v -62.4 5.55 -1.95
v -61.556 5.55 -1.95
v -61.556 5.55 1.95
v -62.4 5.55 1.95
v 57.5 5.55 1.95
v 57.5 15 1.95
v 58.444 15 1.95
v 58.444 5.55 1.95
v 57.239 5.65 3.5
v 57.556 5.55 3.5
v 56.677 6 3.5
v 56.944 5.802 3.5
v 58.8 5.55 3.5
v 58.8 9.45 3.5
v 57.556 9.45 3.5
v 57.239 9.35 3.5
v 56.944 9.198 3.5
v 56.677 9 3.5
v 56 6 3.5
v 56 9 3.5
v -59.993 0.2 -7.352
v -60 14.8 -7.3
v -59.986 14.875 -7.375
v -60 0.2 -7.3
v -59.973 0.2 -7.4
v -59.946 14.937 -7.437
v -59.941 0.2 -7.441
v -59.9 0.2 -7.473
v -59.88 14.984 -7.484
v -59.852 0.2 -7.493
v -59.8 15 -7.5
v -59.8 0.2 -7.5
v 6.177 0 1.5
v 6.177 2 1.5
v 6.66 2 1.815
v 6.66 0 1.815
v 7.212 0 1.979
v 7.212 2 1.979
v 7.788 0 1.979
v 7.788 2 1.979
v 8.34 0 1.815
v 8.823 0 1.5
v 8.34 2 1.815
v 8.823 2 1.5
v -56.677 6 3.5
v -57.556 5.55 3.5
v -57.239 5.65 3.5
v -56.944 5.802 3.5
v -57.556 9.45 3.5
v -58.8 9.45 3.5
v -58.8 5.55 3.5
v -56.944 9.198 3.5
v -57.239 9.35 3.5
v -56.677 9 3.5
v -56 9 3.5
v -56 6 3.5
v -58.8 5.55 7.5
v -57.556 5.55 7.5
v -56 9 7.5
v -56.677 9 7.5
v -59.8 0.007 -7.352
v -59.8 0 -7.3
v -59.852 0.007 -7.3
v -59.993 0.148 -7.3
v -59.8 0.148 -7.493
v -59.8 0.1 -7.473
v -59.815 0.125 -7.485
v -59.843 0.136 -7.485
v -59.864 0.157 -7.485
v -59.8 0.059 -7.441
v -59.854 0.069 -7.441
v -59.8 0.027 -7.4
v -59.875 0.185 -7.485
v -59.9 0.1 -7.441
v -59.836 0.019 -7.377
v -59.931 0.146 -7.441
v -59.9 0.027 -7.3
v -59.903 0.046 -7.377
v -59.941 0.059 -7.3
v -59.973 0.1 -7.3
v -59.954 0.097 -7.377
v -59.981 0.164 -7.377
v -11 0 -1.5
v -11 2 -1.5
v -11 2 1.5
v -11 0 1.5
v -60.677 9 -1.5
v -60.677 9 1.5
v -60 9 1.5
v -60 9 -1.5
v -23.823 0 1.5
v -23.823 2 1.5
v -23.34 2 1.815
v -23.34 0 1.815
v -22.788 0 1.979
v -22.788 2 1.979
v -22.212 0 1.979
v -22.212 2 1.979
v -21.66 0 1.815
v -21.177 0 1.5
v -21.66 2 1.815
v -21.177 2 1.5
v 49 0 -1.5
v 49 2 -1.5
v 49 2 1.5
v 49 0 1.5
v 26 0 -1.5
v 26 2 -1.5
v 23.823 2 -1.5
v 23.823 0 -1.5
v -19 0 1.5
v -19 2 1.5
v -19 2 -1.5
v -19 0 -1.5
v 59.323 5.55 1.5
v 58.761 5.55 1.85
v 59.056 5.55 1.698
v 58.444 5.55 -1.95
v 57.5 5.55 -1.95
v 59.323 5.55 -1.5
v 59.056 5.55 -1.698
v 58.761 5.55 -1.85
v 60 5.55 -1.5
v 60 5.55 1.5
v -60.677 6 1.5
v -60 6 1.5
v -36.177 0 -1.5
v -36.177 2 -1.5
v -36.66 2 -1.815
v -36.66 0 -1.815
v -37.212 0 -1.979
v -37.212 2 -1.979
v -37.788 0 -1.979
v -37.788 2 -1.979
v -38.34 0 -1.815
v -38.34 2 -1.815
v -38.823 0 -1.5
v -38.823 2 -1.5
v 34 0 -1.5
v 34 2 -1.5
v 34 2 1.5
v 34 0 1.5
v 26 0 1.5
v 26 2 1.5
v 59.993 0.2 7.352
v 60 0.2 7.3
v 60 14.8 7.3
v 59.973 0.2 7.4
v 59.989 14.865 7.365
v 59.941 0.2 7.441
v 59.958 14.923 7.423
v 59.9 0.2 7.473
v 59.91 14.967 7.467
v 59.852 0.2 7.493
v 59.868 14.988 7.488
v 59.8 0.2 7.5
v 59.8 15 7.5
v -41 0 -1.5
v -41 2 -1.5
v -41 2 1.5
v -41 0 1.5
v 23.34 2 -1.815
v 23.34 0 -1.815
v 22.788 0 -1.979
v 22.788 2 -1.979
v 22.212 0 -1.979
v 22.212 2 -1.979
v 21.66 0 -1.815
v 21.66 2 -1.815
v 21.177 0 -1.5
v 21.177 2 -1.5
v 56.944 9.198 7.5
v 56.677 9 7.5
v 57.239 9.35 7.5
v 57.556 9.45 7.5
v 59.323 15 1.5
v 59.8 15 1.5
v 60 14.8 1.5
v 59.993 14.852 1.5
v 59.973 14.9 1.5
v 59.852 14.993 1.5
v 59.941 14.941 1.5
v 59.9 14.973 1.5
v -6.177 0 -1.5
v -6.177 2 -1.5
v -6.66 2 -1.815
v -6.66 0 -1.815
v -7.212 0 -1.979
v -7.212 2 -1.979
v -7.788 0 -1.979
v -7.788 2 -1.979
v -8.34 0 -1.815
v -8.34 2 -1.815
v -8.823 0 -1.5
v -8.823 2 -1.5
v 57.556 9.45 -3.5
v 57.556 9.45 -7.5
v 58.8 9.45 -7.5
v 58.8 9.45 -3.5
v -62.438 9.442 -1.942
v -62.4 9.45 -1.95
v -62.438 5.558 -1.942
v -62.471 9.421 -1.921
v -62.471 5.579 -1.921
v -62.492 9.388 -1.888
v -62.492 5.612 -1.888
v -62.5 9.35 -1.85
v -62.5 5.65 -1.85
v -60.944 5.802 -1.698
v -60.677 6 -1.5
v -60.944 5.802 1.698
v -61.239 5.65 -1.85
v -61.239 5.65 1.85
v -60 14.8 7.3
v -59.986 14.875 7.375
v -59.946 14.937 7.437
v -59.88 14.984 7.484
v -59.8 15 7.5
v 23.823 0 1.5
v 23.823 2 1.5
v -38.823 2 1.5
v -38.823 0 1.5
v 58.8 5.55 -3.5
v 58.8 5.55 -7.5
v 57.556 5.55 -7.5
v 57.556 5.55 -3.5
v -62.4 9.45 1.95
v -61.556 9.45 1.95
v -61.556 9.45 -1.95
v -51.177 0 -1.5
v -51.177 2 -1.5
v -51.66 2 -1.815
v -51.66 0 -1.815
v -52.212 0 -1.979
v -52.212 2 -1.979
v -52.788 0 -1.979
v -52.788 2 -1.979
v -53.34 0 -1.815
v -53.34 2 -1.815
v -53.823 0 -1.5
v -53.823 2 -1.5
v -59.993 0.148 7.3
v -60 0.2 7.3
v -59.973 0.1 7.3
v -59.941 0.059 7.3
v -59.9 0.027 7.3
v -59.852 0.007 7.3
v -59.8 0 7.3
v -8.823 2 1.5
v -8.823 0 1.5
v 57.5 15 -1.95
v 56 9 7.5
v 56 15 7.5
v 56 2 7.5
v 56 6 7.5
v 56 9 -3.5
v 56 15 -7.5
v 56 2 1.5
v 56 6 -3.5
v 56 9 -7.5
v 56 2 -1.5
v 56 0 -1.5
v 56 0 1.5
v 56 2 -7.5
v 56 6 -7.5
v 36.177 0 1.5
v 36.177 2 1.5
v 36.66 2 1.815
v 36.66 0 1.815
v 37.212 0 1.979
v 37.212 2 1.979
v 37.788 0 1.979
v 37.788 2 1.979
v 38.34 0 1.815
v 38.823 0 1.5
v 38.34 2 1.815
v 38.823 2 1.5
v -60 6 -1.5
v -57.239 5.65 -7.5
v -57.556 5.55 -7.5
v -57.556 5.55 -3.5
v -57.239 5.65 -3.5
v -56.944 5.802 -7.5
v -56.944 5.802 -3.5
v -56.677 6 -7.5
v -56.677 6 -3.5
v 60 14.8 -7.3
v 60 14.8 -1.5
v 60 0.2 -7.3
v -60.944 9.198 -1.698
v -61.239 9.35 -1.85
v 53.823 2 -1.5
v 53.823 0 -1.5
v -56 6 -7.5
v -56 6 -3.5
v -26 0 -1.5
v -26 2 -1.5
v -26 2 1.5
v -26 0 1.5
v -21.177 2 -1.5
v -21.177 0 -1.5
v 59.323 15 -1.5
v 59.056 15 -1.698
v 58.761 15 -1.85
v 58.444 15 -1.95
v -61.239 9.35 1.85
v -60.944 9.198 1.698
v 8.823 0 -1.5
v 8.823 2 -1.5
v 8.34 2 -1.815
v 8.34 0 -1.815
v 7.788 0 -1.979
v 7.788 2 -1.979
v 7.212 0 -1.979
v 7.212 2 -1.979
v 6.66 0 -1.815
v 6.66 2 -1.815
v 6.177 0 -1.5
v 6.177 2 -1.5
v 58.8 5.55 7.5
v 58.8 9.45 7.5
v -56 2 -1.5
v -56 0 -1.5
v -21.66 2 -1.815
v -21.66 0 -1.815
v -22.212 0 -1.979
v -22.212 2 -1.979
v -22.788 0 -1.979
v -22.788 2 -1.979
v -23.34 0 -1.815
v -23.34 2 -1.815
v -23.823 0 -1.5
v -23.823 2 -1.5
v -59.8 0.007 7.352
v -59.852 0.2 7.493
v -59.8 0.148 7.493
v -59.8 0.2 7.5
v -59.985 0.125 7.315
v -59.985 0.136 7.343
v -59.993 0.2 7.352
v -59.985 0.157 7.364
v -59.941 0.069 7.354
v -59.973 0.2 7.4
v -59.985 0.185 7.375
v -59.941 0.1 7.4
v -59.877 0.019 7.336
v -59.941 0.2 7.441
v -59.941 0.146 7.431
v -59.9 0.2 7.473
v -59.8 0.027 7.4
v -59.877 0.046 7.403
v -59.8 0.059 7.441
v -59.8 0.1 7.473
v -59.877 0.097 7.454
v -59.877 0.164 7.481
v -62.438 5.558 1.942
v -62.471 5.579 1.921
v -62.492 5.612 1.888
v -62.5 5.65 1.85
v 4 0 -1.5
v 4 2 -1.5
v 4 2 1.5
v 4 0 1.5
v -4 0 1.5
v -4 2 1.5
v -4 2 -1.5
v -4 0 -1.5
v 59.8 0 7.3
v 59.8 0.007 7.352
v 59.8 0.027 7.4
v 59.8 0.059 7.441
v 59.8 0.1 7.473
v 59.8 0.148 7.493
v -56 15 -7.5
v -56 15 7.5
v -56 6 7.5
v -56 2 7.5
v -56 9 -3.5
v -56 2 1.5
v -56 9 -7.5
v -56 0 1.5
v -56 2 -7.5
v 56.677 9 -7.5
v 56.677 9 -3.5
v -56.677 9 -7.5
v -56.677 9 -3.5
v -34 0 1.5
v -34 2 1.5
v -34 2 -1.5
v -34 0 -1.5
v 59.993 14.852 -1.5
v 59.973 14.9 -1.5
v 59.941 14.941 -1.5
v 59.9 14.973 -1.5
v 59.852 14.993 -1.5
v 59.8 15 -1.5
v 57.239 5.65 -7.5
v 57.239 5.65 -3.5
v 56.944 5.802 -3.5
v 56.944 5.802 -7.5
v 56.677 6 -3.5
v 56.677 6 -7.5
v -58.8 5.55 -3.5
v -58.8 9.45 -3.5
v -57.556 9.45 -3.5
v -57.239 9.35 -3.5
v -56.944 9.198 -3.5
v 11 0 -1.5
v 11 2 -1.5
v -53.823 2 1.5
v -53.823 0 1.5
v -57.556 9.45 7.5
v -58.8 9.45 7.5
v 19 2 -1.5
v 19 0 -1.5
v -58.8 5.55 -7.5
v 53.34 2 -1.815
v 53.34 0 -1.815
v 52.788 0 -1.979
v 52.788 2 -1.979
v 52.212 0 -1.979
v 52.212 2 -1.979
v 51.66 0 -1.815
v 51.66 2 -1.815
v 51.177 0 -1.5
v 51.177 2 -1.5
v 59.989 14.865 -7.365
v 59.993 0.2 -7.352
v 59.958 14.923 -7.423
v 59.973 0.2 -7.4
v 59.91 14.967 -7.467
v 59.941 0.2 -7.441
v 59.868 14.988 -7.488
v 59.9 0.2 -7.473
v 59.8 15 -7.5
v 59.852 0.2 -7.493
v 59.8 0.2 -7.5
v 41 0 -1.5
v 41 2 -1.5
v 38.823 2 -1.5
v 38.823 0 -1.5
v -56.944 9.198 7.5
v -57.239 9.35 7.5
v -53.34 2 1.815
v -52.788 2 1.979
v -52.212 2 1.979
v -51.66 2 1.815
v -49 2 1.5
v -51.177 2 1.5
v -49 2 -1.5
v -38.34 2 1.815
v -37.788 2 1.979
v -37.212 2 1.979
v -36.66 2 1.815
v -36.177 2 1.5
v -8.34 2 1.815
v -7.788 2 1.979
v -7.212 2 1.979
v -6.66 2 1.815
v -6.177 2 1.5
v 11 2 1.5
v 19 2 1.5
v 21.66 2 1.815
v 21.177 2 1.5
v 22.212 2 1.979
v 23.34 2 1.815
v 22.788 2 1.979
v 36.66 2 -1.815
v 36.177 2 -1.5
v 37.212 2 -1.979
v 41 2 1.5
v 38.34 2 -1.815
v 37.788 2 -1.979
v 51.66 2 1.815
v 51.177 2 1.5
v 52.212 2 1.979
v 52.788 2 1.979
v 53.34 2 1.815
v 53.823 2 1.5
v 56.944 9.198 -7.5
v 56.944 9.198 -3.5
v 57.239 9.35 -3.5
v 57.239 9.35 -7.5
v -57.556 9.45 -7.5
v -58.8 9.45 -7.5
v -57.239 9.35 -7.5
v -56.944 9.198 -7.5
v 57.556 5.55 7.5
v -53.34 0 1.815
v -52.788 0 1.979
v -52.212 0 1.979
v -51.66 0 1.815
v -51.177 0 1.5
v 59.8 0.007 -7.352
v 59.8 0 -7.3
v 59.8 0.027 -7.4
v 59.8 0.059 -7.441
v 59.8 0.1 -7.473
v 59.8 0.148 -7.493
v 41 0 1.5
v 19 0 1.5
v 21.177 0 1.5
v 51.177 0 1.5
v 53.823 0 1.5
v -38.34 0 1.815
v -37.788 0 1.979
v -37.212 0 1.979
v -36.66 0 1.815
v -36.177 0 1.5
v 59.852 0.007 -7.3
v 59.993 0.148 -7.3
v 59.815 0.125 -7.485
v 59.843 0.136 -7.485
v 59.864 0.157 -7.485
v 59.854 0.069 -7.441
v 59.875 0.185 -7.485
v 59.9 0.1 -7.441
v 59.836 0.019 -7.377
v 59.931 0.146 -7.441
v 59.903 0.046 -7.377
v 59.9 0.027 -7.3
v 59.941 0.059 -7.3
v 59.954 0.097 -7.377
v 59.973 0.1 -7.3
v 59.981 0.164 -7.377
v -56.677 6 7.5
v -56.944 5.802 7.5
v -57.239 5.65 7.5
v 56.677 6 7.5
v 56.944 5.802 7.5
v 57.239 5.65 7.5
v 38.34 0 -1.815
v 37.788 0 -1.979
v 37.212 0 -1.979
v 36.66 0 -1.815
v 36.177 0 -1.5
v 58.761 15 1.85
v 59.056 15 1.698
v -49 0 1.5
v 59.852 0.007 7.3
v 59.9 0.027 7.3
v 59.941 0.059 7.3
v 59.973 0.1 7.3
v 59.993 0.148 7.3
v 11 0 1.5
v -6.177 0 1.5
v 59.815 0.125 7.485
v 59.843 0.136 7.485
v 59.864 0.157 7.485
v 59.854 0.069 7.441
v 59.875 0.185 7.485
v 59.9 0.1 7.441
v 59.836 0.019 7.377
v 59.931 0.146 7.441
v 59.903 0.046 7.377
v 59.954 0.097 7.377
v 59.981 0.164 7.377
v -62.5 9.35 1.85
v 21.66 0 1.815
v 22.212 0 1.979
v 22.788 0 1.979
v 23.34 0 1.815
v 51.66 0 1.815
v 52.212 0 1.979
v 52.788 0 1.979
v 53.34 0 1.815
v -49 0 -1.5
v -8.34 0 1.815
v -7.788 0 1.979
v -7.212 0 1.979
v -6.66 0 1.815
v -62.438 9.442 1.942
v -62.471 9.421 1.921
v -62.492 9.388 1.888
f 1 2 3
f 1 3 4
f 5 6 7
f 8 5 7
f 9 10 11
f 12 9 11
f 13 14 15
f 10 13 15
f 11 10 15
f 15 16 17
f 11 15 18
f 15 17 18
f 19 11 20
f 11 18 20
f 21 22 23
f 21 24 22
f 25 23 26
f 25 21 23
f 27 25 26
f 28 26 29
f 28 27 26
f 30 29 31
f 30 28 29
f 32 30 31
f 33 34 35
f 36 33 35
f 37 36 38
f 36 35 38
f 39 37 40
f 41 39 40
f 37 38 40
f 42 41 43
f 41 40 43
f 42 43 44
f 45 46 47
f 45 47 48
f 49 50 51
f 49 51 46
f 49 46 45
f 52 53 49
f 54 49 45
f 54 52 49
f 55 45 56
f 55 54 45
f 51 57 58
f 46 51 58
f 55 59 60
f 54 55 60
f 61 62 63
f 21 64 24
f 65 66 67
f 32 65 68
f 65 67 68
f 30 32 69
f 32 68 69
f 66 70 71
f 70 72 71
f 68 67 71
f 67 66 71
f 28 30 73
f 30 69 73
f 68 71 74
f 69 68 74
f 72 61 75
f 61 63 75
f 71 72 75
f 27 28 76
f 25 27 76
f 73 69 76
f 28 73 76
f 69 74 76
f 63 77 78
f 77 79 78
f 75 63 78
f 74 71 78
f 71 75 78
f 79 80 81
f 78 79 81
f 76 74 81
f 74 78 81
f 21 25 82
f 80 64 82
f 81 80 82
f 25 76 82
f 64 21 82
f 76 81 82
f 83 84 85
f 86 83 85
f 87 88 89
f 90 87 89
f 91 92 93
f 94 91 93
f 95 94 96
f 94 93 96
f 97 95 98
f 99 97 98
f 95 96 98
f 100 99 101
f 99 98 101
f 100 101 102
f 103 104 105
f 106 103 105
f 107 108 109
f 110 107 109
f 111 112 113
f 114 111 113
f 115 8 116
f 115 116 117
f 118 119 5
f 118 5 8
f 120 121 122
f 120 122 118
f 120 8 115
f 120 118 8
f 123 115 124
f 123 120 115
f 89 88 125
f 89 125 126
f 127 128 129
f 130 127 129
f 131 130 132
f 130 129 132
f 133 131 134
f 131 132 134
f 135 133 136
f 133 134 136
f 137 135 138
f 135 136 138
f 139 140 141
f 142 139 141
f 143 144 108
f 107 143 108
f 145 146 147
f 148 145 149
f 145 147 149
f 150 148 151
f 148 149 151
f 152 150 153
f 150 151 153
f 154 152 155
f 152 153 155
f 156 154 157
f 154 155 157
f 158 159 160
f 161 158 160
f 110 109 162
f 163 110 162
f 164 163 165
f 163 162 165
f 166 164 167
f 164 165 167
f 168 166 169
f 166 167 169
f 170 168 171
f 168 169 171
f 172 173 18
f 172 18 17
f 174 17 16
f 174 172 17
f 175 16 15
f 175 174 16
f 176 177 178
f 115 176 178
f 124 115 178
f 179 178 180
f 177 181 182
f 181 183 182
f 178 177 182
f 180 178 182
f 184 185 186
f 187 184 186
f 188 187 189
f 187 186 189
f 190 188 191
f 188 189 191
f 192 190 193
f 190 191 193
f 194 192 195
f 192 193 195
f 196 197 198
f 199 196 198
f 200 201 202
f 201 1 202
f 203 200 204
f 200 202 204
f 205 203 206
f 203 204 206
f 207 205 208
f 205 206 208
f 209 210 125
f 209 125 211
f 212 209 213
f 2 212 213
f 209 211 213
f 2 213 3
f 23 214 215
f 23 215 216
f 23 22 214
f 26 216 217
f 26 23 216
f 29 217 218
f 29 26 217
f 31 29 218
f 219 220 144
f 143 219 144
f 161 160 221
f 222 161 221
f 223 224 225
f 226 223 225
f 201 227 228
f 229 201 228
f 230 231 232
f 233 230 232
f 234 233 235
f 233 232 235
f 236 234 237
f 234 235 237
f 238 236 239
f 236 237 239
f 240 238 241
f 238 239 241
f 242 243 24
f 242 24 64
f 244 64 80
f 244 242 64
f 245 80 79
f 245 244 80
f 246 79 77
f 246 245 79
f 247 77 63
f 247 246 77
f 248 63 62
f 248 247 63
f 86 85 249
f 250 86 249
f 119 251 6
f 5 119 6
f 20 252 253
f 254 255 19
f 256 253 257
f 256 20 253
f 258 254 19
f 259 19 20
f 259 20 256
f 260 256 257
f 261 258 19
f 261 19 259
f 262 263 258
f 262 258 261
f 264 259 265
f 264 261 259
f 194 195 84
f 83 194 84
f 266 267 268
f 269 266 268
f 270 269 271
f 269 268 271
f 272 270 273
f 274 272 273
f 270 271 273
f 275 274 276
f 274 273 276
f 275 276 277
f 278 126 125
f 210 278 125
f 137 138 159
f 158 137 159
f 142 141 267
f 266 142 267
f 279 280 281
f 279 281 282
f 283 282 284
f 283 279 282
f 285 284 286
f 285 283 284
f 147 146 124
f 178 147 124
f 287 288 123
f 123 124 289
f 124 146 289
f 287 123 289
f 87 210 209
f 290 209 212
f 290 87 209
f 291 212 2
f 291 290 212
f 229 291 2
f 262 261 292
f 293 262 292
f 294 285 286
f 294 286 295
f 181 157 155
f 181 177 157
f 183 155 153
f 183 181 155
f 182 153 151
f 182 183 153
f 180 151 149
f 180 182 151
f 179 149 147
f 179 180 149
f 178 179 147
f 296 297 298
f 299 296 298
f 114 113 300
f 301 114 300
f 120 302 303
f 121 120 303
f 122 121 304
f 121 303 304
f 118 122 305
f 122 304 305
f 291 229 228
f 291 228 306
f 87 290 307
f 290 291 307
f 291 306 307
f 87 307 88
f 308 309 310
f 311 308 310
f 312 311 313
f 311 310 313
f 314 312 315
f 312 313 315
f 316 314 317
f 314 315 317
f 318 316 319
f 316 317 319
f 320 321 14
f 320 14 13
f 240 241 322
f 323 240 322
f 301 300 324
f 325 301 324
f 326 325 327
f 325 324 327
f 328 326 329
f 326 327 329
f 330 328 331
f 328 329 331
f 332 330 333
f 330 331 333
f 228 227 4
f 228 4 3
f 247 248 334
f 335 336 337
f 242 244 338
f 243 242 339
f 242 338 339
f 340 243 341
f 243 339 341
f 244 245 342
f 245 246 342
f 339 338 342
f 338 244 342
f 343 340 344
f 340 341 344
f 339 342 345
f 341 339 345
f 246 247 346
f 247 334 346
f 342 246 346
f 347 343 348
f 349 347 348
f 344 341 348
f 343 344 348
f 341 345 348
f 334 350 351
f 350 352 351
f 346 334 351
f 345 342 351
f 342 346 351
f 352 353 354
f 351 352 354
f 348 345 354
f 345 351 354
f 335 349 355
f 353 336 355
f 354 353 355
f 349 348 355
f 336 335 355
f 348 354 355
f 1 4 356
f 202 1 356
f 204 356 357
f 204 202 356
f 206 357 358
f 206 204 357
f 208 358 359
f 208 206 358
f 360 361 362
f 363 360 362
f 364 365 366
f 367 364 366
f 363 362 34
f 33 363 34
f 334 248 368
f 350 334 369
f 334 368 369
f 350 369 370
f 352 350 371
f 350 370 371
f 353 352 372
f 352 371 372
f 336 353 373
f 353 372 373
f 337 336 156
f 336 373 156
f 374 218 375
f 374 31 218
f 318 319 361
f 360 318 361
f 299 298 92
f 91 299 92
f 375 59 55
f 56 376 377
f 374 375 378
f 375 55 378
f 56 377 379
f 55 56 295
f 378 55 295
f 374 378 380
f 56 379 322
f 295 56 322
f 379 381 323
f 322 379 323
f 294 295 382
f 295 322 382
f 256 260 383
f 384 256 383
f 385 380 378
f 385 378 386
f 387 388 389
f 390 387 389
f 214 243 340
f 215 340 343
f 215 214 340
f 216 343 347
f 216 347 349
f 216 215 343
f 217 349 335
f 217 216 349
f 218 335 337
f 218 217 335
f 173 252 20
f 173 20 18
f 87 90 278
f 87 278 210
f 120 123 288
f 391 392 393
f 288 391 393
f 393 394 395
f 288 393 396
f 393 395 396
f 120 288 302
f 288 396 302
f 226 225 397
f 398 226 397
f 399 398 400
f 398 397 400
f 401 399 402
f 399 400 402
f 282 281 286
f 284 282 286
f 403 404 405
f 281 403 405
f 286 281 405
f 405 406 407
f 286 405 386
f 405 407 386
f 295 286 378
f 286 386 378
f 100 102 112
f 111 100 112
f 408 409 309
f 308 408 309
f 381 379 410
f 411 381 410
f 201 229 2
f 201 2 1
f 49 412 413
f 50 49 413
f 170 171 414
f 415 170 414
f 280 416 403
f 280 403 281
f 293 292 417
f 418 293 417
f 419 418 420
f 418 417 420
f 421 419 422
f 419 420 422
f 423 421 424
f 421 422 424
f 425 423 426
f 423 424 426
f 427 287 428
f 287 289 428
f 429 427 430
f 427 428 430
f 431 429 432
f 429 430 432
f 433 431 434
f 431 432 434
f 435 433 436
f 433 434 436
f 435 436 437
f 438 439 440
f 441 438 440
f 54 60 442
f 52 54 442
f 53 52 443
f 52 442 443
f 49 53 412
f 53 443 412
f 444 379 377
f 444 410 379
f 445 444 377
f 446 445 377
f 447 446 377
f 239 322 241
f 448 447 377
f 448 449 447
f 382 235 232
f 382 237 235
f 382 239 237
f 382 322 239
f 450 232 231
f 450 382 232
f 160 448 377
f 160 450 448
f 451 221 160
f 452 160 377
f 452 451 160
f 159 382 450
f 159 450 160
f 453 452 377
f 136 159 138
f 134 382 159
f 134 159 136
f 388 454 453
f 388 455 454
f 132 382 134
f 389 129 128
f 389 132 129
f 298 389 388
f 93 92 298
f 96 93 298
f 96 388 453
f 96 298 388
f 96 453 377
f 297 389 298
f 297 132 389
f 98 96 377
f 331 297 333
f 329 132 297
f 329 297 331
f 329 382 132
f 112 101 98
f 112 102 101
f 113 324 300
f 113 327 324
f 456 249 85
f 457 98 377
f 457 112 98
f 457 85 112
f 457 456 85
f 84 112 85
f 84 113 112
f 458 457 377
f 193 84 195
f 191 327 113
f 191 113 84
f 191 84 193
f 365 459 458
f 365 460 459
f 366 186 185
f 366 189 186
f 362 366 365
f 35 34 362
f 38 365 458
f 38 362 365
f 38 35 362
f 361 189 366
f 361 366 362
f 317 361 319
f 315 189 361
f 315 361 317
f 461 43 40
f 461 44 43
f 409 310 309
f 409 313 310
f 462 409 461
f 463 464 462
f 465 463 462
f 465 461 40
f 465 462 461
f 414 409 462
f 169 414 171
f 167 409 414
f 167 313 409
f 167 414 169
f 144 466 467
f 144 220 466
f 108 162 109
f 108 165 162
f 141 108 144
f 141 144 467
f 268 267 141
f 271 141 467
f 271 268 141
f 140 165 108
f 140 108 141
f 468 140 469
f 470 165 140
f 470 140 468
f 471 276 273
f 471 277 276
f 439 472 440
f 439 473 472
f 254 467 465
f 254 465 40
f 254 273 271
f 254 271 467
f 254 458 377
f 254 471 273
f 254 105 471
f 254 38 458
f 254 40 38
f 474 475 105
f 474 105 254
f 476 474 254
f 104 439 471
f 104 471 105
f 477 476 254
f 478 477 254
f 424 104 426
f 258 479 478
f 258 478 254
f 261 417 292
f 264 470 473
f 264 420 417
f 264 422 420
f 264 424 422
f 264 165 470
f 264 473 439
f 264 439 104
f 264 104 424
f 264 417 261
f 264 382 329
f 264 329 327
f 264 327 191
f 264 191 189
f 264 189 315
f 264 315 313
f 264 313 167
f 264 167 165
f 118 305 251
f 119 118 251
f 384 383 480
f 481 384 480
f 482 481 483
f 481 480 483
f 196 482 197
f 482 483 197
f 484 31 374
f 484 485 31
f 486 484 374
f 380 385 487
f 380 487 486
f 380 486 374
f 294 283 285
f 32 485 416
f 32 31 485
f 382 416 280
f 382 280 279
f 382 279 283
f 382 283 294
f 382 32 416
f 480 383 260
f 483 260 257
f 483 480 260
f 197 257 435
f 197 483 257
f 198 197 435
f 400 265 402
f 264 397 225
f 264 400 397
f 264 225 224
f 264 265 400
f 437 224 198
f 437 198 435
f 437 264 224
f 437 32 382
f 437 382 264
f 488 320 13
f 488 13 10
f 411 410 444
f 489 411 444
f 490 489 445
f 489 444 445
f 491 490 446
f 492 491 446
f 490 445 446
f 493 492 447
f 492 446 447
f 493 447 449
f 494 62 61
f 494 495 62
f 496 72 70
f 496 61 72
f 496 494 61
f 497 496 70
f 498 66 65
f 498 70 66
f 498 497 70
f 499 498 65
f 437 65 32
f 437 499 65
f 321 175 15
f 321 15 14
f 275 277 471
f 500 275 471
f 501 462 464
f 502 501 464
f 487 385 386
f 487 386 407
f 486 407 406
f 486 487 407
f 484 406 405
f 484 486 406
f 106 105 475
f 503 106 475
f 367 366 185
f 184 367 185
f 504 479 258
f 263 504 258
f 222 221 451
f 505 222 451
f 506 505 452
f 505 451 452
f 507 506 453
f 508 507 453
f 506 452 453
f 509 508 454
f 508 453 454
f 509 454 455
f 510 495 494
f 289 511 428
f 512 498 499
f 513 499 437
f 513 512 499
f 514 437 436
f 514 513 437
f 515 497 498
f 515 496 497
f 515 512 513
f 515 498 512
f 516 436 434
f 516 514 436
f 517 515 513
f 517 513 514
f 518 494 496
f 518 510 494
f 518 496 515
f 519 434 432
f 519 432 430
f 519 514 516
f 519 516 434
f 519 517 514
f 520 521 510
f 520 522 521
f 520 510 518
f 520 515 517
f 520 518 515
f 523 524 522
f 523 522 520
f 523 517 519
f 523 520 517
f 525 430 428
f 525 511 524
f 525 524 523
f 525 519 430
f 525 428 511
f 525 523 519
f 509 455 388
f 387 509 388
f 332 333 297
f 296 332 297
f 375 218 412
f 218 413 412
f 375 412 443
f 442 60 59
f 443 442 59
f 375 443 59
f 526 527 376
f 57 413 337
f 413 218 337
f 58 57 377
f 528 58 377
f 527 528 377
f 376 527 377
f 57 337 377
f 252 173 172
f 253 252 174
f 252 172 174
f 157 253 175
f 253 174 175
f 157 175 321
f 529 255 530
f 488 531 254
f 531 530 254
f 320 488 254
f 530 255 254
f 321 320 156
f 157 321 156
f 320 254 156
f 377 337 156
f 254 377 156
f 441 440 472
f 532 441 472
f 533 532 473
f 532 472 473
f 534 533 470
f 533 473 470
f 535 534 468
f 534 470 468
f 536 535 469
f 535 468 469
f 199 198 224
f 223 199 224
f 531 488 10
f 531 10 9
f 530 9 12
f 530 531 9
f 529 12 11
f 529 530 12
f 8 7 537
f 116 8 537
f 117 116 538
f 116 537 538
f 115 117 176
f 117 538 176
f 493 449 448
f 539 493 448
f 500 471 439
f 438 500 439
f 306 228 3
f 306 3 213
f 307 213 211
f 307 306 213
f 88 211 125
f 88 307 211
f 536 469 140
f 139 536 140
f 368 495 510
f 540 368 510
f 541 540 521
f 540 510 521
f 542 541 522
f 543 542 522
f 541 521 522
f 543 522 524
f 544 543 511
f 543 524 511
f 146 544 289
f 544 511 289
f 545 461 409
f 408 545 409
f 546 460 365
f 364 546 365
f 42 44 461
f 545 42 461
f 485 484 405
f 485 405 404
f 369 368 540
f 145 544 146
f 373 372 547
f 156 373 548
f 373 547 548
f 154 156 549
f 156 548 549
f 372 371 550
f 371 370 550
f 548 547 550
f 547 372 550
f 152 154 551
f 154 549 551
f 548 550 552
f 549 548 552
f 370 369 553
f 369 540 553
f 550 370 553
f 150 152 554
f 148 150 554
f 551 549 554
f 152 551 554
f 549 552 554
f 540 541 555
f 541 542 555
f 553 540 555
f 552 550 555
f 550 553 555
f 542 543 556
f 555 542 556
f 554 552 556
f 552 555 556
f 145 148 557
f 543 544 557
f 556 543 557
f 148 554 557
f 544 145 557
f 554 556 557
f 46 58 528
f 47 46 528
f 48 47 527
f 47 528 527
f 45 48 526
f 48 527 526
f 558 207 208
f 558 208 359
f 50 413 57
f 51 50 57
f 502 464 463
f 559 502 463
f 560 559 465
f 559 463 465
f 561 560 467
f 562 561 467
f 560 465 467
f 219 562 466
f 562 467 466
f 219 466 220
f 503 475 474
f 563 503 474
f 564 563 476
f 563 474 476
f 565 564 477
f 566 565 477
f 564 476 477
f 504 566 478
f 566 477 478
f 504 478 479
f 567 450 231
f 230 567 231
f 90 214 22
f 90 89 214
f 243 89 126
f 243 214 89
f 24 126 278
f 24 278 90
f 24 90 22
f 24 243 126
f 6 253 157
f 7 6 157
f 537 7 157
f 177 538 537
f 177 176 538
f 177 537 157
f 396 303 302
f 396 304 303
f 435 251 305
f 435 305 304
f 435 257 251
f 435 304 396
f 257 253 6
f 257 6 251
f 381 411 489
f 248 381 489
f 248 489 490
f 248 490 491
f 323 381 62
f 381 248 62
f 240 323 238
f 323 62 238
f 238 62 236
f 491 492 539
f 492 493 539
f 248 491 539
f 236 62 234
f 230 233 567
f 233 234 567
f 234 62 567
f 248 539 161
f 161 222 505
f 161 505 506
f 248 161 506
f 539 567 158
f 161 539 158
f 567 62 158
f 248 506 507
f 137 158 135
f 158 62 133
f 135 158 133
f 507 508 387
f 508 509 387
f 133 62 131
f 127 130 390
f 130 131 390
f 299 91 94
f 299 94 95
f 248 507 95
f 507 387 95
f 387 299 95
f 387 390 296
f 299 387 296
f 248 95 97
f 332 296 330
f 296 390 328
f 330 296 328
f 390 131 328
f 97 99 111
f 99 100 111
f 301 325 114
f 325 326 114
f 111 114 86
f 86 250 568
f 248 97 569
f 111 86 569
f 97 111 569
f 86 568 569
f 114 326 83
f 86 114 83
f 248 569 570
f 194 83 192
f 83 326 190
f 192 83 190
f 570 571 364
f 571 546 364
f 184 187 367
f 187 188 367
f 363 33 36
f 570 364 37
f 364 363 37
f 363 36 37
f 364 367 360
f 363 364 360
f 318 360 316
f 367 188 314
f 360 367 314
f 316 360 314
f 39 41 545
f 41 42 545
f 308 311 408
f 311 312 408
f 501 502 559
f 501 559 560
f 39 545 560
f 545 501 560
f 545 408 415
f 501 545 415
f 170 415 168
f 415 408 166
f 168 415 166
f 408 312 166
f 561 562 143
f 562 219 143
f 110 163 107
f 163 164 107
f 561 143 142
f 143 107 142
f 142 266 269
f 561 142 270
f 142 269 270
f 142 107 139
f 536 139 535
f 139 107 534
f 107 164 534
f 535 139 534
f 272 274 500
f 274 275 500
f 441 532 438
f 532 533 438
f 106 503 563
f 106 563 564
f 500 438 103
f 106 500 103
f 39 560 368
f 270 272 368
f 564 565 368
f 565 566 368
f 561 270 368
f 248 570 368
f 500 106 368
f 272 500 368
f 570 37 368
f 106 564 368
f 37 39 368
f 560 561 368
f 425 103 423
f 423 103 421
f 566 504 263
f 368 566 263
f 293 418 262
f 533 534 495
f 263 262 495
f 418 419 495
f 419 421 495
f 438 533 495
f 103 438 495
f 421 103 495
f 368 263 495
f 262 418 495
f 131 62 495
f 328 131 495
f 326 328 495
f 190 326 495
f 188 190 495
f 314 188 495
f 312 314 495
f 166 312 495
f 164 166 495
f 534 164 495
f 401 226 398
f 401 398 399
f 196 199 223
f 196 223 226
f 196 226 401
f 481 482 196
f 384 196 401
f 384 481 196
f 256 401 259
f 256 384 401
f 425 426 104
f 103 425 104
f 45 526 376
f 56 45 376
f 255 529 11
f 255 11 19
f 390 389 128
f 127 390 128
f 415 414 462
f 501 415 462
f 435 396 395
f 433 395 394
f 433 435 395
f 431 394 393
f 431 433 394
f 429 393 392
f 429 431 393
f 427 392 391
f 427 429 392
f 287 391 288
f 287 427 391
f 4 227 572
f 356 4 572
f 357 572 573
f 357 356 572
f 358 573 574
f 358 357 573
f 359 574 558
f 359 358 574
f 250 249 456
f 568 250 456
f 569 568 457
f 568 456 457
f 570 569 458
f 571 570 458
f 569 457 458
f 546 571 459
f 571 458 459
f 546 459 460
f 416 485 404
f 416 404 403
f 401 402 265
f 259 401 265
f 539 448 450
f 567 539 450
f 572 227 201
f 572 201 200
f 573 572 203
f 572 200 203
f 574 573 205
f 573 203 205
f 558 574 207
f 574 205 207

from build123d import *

# Parameters (mm, degrees)
SKETCH_1_W                 = 120
SKETCH_1_H                 = 15
EXTRUDE_1_DEPTH            = 2
SKETCH_2_W                 = 4
SKETCH_2_H                 = 15
EXTRUDE_2_DEPTH            = 13
CUT_EXTRUDE_1_REACH        = 63.849
PATTERN_LINEAR_1_COUNT     = 5
PATTERN_LINEAR_1_PITCH     = 15
PATTERN_LINEAR_1_COL_COUNT = 4
PATTERN_LINEAR_1_COL_PITCH = 15
CUT_EXTRUDE_2_DEPTH        = 4
MIRROR_2_COPY_1_DEPTH      = 4
CUT_EXTRUDE_3_DEPTH        = 9.45
EXTRUDE_3_DEPTH            = 15
CUT_EXTRUDE_4_DEPTH        = 15
FILLET_1_R                 = 0.2
FILLET_2_R                 = 0.1


with BuildPart() as part:
    # 草图1 → 凸台-拉伸1 (new body)
    with BuildSketch(Plane(origin=(0, 0, 0), x_dir=(1, 0, 0), z_dir=(0, 1, 0))):
        Rectangle(SKETCH_1_W, SKETCH_1_H)
    extrude(amount=EXTRUDE_1_DEPTH)

    # 草图2 → 凸台-拉伸2 (add)
    with BuildSketch(Plane(origin=(0, 2, 0), x_dir=(1, 0, 0), z_dir=(0, 1, 0))):
        with Locations((-58, 0)):
            Rectangle(SKETCH_2_W, SKETCH_2_H)
        with Locations((58, 0)):
            Rectangle(SKETCH_2_W, SKETCH_2_H)
    extrude(amount=EXTRUDE_2_DEPTH)

    # 草图3 → 切除-拉伸1 (cut, up to next)
    with BuildSketch(Plane(origin=(0, 2, 0), x_dir=(1, 0, 0), z_dir=(0, 1, 0)), mode=Mode.PRIVATE) as cut_extrude_1_sk1:
        with BuildLine():
            Line((-4, -1.5), (-4, 1.5))
            Line((-4, 1.5), (-6.177124344, 1.5))
            ThreePointArc((-6.177124344, 1.5), (-7.5, 2), (-8.822875656, 1.5))
            Line((-8.822875656, 1.5), (-11, 1.5))
            Line((-11, 1.5), (-11, -1.5))
            Line((-11, -1.5), (-8.822875656, -1.5))
            ThreePointArc((-8.822875656, -1.5), (-7.5, -2), (-6.177124344, -1.5))
            Line((-6.177124344, -1.5), (-4, -1.5))
        make_face()
    cut_extrude_1_tool1 = extrude(cut_extrude_1_sk1.sketch, amount=-CUT_EXTRUDE_1_REACH, mode=Mode.PRIVATE) & part.part
    cut_extrude_1 = cut_extrude_1_tool1.solids().sort_by_distance((-7.5, 2, 0))[0]
    add(cut_extrude_1, mode=Mode.SUBTRACT)

    # 阵列(线性)1: 切除-拉伸1 ×5
    with Locations(*[(i * PATTERN_LINEAR_1_PITCH, 0, 0) for i in range(1, PATTERN_LINEAR_1_COUNT)]):
        add(cut_extrude_1, mode=Mode.SUBTRACT)

    # 阵列(线性)1 col: 切除-拉伸1 ×4
    with Locations(*[(-i * PATTERN_LINEAR_1_COL_PITCH, 0, 0) for i in range(1, PATTERN_LINEAR_1_COL_COUNT)]):
        add(cut_extrude_1, mode=Mode.SUBTRACT)

    # 草图4 → 切除-拉伸2 (cut)
    with BuildSketch(Plane.XY.offset(7.5)):
        with BuildLine():
            Line((-56, 6), (-56, 9))
            Line((-56, 9), (-56.677124344, 9))
            ThreePointArc((-56.677124344, 9), (-57.088161527, 9.280042303), (-57.555590279, 9.45))
            Line((-57.555590279, 9.45), (-58.8, 9.45))
            Line((-58.8, 9.45), (-58.8, 5.55))
            Line((-58.8, 5.55), (-57.555590279, 5.55))
            ThreePointArc((-57.555590279, 5.55), (-57.088161527, 5.719957697), (-56.677124344, 6))
            Line((-56.677124344, 6), (-56, 6))
        make_face()
    cut_extrude_2 = extrude(amount=-CUT_EXTRUDE_2_DEPTH, mode=Mode.SUBTRACT)

    # 镜向1: 切除-拉伸2 across plane
    add(cut_extrude_2.mirror(Plane.XY), mode=Mode.SUBTRACT)

    # 镜向2: 切除-拉伸2 across plane
    add(cut_extrude_2.mirror(Plane(origin=(0, 0, 0), x_dir=(0, 0, 1), z_dir=(1, 0, 0))), mode=Mode.SUBTRACT)

    # 镜向2 copy 1 sketch → 镜向2 copy 1 (cut)
    with BuildSketch(Plane(origin=(0, 0, -7.5), x_dir=(-1, 0, 0), z_dir=(0, 0, -1))):
        with BuildLine():
            Line((-56, 6), (-56, 9))
            Line((-56, 9), (-56.677124344, 9))
            ThreePointArc((-56.677124344, 9), (-57.088161527, 9.280042303), (-57.555590279, 9.45))
            Line((-57.555590279, 9.45), (-58.8, 9.45))
            Line((-58.8, 9.45), (-58.8, 5.55))
            Line((-58.8, 5.55), (-57.555590279, 5.55))
            ThreePointArc((-57.555590279, 5.55), (-57.088161527, 5.719957697), (-56.677124344, 6))
            Line((-56.677124344, 6), (-56, 6))
        make_face()
    extrude(amount=-MIRROR_2_COPY_1_DEPTH, mode=Mode.SUBTRACT)

    # 草图5 → 切除-拉伸3 (cut)
    with BuildSketch(Plane(origin=(0, 15, 0), x_dir=(1, 0, 0), z_dir=(0, 1, 0))):
        with BuildLine():
            Line((60, -1.5), (60, 1.5))
            Line((60, 1.5), (59.322875656, 1.5))
            ThreePointArc((59.322875656, 1.5), (58.911838473, 1.780042303), (58.444409721, 1.95))
            Line((58.444409721, 1.95), (57.5, 1.95))
            Line((57.5, 1.95), (57.5, -1.95))
            Line((57.5, -1.95), (58.444409721, -1.95))
            ThreePointArc((58.444409721, -1.95), (58.911838473, -1.780042303), (59.322875656, -1.5))
            Line((59.322875656, -1.5), (60, -1.5))
        make_face()
    extrude(amount=-CUT_EXTRUDE_3_DEPTH, mode=Mode.SUBTRACT)

    # 草图6 → 凸台-拉伸3 (add)
    with BuildSketch(Plane(origin=(0, 15, 0), x_dir=(1, 0, 0), z_dir=(0, 1, 0))):
        with BuildLine():
            Line((-60, -1.5), (-60, 1.5))
            Line((-60, 1.5), (-60.677124344, 1.5))
            ThreePointArc((-60.677124344, 1.5), (-61.088161527, 1.780042303), (-61.555590279, 1.95))
            Line((-61.555590279, 1.95), (-62.5, 1.95))
            Line((-62.5, 1.95), (-62.5, -1.95))
            Line((-62.5, -1.95), (-61.555590279, -1.95))
            ThreePointArc((-61.555590279, -1.95), (-61.088161527, -1.780042303), (-60.677124344, -1.5))
            Line((-60.677124344, -1.5), (-60, -1.5))
        make_face()
    extrude(amount=-EXTRUDE_3_DEPTH)

    # 草图7 → 切除-拉伸4 (cut)
    with BuildSketch(Plane.XY.offset(7.5)):
        with BuildLine():
            Line((-62.5, 9.45), (-61.555590279, 9.45))
            ThreePointArc((-61.555590279, 9.45), (-61.088161527, 9.280042303), (-60.677124344, 9))
            Line((-60.677124344, 9), (-60, 9))
            Line((-60, 9), (-60, 15))
            Line((-60, 15), (-62.5, 15))
            Line((-62.5, 15), (-62.5, 9.45))
        make_face()
        with BuildLine():
            Line((-60, 0), (-60, 6))
            Line((-60, 6), (-60.677124344, 6))
            ThreePointArc((-60.677124344, 6), (-61.088161527, 5.719957697), (-61.555590279, 5.55))
            Line((-61.555590279, 5.55), (-62.5, 5.55))
            Line((-62.5, 5.55), (-62.5, 0))
            Line((-62.5, 0), (-60, 0))
        make_face()
    extrude(amount=-CUT_EXTRUDE_4_DEPTH, mode=Mode.SUBTRACT)

    # 圆角1
    fillet_1_edges = [part.edges().sort_by_distance(p)[0] for p in [
        (-60, 15, 0),
        (60, 15, 4.5),
        (60, 15, -4.5),
        (60, 0, 0),
        (0, 0, 7.5),
        (-60, 0, 0),
        (0, 0, -7.5),
        (60, 7.5, -7.5),
        (60, 7.5, 7.5),
        (-60, 7.5, 7.5),
        (-60, 7.5, -7.5),
    ]]
    fillet(fillet_1_edges, radius=FILLET_1_R)

    # 圆角2
    fillet_2_edges = [part.edges().sort_by_distance(p)[0] for p in [
        (-62.5, 7.5, -1.95),
        (-62.5, 7.5, 1.95),
        (-62.5, 5.55, 0),
        (-62.5, 9.45, 0),
    ]]
    fillet(fillet_2_edges, radius=FILLET_2_R)


solid = part.part
